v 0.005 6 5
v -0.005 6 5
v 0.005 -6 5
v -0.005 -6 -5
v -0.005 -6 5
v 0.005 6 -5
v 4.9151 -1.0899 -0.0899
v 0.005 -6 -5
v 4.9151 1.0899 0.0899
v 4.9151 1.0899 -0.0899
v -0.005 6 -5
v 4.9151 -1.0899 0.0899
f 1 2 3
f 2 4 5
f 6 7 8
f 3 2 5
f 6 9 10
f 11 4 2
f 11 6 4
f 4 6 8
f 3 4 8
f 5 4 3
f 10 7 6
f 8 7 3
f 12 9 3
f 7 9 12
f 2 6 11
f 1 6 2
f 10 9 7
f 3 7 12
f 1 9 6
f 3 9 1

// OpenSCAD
// file: params_quadbrace.scad
// params_quadbrace.scad
// Shared parameters for pusher/sleeve(part2)/slider(part5)/pyramids/wristbrace demos
// Units: mm. OpenSCAD 2021.01 compatible.

$fn = 64;
eps = 0.02;

// --- Part 9 / pusher ---
stem_len = 35;
stem_w   = 11;
stem_h   = 9;

stem_ext_len = 10;
stem_ext_w   = 7;
stem_ext_h   = 5;

head_attach_scale = 0.75;

// "header" outer block style (solid, no hole)
sleeve_t = 4.9;
sleeve_w = 12;
sleeve_h = 10;
sleeve_r = 1.0;

// --- Sleeve hole sizing (Part 2 slider-with-hole) ---
fit_clearance = 0.7;
head_w = 7;
head_h = 5;

hole_w_y = head_w + 2*fit_clearance;
hole_h_z = head_h + 2*fit_clearance;
hole_r   = 0.8;

// --- Part 5 slider (faceted) ---
slider_len_x = 13.0;
slider_w_y   = 11.54376125;
slider_h_z   = 9.0;
xy_clearance = 0.0;

enable_pegs  = true;
peg_d        = 2.2;
peg_len_y    = 2.5;
peg_z_center = 0.5;
peg_x_spacing = slider_len_x/2;
peg_on_max_y  = true;

// --- Pyramid defaults ---
pyr_height_x = 4.91014528;
pyr_width_y  = 12.0;
pyr_depth_z  = 10.0;
pyr_slope_deg = 45;

// --- Wristbrace sine sweep demo ---
sine_length = 120;
sine_amplitude = 15;
sine_wavelength = 40;
sine_steps = 80;
sweep_cube_size = [4,4,4];
// main file
// pyramid.scad
// Truncated pyramid with 45° slope using shared defaults (matches STL extents)
include <params_quadbrace.scad>;

slope_deg = pyr_slope_deg;

shrink = 2 * pyr_height_x * tan(slope_deg);
top_width_y = pyr_width_y - shrink;
top_depth_z = pyr_depth_z - shrink;

eps2 = 0.01;

module frustum_45(height_x, width_y, depth_z, top_w, top_d) {
    hull() {
        // base at x=0
        translate([0,0,0]) cube([eps2, width_y, depth_z], center=true);
        // top at x=height
        translate([height_x,0,0]) cube([eps2, max(eps2,top_w), max(eps2,top_d)], center=true);
    }
}

frustum_45(pyr_height_x, pyr_width_y, pyr_depth_z, top_width_y, top_depth_z);
